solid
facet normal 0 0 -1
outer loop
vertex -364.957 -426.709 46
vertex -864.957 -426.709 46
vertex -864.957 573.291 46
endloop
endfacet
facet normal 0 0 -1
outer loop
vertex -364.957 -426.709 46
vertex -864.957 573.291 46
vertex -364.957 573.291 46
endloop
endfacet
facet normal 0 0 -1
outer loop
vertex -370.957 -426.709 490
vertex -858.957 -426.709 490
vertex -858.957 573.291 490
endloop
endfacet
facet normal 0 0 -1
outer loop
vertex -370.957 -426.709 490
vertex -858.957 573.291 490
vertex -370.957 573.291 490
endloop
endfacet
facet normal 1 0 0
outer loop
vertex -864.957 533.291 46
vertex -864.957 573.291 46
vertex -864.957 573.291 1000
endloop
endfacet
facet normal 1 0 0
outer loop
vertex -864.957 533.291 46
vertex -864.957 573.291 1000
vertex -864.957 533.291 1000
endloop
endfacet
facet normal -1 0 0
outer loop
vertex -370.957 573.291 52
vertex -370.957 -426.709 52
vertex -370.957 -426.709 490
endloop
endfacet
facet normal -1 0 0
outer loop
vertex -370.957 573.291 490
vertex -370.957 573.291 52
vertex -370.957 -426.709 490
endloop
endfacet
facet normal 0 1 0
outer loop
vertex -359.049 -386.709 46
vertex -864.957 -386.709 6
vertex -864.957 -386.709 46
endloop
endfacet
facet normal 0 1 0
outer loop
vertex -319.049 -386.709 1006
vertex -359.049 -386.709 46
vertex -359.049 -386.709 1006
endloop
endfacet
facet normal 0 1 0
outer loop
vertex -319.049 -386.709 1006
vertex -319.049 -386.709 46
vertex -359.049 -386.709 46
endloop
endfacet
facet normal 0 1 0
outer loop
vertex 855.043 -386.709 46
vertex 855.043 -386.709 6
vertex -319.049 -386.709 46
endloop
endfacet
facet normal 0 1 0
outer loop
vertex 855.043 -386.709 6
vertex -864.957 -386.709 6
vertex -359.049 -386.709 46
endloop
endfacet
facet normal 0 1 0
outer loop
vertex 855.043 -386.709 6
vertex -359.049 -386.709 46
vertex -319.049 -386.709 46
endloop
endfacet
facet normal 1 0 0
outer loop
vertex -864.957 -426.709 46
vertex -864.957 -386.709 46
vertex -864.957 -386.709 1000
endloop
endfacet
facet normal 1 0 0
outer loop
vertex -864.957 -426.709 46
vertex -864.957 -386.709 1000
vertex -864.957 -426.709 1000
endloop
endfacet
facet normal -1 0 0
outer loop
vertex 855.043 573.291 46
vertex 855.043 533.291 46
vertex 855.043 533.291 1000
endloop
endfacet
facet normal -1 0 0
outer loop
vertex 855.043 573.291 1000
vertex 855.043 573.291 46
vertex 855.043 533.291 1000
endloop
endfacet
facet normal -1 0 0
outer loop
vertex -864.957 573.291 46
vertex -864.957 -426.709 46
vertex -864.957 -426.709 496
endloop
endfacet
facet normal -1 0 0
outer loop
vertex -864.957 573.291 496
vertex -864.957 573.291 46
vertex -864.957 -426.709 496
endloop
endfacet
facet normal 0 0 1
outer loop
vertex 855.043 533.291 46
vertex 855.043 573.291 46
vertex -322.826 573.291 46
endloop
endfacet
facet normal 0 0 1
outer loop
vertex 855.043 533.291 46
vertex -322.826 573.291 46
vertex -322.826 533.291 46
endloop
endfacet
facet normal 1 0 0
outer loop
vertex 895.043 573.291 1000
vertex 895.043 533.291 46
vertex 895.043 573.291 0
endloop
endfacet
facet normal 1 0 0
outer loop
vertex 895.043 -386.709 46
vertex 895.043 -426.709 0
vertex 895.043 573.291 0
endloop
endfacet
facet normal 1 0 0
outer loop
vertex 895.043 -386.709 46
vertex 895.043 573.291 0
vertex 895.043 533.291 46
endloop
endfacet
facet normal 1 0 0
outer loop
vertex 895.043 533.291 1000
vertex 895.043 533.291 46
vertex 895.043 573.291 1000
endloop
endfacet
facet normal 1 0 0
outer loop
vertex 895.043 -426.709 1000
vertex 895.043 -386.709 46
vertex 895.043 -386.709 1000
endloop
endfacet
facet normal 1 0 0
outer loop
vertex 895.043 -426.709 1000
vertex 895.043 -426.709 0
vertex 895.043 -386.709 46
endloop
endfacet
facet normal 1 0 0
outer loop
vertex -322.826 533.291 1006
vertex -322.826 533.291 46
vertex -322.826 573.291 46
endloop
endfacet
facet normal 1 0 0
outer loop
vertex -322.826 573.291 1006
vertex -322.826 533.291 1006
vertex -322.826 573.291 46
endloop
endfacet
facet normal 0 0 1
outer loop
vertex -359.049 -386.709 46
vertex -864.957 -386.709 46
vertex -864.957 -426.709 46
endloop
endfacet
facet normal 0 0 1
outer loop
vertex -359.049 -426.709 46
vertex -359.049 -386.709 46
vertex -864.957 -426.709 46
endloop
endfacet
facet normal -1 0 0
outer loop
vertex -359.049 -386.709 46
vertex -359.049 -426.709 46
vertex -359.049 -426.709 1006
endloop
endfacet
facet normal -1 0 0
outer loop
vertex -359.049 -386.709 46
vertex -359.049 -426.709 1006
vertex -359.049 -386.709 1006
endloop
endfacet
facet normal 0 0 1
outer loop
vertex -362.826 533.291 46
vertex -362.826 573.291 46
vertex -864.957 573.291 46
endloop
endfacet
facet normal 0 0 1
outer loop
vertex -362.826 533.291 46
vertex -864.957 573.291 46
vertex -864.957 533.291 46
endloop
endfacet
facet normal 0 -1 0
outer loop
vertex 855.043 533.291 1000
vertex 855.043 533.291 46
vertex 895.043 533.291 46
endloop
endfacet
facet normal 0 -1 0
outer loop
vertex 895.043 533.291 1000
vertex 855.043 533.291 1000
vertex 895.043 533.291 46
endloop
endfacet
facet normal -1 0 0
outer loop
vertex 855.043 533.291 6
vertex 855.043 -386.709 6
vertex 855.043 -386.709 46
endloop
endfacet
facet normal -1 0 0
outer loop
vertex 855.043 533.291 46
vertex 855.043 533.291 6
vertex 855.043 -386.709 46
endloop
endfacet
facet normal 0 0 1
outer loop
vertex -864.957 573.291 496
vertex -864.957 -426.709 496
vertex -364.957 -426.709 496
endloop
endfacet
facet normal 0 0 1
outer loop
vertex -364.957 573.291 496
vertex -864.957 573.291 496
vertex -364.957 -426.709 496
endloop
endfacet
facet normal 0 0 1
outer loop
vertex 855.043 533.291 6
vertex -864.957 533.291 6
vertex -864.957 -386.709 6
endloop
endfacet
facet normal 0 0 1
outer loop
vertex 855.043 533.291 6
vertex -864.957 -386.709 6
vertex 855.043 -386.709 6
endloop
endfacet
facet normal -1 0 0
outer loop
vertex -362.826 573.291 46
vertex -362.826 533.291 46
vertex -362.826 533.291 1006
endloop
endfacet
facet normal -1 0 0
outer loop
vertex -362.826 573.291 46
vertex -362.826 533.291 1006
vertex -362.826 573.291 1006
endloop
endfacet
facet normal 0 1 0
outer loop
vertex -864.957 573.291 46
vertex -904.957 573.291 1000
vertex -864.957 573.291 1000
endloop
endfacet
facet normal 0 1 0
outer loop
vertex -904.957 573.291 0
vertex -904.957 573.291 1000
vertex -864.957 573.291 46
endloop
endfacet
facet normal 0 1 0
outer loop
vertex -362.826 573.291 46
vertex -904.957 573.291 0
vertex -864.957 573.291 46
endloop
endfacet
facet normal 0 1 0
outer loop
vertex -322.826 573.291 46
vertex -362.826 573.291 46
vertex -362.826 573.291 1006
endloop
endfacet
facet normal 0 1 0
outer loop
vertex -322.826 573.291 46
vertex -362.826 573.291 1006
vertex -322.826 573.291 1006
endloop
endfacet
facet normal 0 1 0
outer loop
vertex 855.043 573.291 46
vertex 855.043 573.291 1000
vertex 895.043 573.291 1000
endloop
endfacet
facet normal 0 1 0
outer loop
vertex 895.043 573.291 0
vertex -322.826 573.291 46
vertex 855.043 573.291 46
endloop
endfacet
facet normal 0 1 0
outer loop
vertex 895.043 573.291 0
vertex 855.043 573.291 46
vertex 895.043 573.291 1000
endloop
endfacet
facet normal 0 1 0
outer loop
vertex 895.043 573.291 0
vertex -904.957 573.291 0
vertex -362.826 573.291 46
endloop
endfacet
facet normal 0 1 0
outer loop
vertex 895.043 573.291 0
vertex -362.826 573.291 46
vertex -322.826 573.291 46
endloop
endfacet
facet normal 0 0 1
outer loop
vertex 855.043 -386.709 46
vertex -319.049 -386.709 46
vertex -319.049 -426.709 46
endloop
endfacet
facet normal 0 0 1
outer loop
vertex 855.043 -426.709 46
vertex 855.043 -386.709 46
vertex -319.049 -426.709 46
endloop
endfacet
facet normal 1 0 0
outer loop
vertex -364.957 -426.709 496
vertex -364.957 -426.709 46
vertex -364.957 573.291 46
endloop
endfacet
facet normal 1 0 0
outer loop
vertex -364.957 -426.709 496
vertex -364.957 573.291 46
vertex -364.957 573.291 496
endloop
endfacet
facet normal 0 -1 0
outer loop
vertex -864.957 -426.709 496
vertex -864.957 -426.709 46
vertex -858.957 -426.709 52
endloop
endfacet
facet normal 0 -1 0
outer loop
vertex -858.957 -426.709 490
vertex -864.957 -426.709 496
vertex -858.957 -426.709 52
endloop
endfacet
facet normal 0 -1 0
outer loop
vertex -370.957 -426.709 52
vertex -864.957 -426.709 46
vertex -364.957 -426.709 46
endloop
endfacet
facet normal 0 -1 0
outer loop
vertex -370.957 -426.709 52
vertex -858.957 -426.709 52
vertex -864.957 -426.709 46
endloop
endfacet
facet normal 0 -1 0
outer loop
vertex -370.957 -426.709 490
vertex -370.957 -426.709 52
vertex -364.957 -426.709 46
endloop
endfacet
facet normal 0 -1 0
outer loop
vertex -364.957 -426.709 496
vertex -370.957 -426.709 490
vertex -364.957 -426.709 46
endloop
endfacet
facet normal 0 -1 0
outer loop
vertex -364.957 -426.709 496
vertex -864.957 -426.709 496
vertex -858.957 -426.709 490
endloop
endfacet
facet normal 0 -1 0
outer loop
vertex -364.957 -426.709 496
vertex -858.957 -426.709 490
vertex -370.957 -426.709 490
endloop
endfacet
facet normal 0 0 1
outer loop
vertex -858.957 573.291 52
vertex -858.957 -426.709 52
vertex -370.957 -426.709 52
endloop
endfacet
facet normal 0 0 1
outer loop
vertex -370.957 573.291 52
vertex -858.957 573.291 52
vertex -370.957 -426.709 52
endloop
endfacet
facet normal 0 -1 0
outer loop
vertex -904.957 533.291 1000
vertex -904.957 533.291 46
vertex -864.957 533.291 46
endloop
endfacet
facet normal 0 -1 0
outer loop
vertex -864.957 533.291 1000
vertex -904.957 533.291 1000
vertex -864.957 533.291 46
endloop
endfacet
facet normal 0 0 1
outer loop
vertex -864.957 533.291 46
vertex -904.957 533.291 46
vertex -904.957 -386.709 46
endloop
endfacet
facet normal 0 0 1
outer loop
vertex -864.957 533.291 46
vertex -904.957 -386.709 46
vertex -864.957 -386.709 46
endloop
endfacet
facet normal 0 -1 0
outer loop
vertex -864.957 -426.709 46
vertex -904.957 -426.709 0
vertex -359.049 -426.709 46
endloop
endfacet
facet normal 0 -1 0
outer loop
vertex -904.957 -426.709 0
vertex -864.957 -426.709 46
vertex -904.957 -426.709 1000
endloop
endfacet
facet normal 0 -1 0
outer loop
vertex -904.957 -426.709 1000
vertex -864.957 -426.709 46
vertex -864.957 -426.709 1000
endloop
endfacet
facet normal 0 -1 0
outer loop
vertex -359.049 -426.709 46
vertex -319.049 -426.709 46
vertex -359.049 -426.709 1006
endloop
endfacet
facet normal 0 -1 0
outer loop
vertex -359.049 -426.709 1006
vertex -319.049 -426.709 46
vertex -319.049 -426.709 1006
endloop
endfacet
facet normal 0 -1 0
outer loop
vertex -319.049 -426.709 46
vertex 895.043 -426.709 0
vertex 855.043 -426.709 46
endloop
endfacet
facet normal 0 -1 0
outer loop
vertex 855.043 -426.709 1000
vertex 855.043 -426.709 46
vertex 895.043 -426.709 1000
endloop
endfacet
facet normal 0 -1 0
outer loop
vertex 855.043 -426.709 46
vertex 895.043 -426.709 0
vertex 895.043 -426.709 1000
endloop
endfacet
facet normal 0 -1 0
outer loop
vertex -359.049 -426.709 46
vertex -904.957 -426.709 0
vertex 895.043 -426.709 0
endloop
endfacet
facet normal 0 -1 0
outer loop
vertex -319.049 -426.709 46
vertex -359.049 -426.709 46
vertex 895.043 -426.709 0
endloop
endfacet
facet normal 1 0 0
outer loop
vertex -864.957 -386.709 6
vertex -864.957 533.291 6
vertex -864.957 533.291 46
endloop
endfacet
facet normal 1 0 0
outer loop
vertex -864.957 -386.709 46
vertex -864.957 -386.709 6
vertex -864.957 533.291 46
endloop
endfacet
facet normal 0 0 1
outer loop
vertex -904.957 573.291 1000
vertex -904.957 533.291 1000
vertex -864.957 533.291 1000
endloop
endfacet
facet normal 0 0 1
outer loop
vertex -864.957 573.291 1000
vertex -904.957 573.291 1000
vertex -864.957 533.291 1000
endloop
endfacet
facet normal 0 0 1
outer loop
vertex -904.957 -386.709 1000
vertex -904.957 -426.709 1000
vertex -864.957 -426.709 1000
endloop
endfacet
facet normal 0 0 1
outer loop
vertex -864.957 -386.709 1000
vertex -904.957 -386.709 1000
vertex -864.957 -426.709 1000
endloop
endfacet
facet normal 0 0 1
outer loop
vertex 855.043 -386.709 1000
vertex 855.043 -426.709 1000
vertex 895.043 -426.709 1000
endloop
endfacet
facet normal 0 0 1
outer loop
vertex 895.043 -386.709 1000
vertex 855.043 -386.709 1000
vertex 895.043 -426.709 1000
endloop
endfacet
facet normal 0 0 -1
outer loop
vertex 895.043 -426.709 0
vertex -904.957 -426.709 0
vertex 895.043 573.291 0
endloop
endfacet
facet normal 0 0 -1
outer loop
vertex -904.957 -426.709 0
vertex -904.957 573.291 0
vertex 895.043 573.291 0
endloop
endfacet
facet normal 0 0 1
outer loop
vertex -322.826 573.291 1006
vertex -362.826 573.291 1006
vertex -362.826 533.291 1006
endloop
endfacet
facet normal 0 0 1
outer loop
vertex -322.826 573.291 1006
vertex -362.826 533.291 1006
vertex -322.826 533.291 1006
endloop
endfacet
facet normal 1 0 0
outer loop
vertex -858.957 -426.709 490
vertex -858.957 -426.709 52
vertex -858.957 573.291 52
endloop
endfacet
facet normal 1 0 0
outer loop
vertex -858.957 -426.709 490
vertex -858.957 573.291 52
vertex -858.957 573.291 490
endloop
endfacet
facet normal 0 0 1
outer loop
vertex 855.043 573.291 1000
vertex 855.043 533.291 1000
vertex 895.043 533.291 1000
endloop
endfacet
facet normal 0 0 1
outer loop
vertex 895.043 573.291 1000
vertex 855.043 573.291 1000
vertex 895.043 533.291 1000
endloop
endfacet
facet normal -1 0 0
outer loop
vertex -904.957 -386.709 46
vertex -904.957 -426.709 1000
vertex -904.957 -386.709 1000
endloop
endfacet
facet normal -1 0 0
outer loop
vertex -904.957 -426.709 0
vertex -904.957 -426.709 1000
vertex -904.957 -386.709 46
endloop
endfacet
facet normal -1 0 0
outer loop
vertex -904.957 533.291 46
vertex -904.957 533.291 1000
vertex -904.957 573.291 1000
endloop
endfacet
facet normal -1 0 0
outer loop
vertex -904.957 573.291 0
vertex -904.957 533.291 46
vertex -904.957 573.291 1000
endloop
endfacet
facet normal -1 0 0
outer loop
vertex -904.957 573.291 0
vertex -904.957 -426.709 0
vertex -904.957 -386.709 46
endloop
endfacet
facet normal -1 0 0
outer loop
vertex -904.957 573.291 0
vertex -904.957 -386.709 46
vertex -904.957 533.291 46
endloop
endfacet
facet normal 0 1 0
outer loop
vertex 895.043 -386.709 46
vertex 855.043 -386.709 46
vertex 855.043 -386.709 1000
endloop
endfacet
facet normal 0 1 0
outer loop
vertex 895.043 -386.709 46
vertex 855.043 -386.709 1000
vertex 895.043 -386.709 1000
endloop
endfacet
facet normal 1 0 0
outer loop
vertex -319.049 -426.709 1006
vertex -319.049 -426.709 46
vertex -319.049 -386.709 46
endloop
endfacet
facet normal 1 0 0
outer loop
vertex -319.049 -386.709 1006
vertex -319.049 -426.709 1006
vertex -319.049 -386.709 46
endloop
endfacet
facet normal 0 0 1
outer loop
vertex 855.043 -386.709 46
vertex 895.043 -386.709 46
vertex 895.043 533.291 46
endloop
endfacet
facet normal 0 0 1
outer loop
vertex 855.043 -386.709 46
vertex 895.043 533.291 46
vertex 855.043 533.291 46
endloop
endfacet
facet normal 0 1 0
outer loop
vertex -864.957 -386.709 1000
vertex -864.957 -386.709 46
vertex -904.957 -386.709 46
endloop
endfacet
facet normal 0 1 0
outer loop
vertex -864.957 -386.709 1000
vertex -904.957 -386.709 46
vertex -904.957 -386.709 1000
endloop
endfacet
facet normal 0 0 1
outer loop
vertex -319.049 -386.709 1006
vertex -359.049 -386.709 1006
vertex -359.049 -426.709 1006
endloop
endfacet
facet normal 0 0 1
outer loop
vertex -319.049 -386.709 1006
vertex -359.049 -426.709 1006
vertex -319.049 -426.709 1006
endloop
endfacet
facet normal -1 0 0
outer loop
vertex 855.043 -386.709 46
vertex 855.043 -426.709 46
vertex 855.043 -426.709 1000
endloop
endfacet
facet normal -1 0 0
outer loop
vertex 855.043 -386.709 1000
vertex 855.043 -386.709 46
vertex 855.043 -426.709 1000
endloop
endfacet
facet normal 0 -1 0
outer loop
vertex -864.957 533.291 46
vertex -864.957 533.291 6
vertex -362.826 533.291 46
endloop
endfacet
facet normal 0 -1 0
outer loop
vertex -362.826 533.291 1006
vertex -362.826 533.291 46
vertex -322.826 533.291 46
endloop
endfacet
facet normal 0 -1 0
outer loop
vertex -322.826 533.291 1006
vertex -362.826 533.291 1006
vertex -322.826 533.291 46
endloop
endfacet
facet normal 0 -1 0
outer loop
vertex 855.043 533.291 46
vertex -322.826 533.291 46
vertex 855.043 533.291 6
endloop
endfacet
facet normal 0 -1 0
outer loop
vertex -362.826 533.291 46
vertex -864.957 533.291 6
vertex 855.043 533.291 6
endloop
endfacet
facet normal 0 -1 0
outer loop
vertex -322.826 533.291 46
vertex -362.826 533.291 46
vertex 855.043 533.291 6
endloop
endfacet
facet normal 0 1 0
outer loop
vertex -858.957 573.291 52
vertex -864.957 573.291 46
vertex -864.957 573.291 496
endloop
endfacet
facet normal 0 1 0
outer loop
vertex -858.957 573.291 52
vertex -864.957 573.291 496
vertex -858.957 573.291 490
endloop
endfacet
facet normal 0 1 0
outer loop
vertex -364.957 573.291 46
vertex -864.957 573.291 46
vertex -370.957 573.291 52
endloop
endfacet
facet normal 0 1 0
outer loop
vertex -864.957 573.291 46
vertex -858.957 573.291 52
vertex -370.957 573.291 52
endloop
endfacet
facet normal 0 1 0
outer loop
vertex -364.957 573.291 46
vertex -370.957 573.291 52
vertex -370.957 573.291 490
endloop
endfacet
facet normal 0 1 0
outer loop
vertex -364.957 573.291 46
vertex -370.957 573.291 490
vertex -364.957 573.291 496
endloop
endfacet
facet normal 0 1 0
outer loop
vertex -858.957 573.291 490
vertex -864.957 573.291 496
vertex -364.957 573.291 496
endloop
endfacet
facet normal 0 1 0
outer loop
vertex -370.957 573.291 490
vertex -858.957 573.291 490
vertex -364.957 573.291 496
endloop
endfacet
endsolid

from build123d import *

# Parameters (mm, degrees)
F0_W      = 1800
F0_H      = 1000
F1_DEPTH  = 6
F2_W      = 40
F2_H      = 40
F3_DEPTH  = 1000
F4_W      = 40
F4_H      = 40
F5_DEPTH  = 935
F6_W      = 40
F6_H      = 40
F7_DEPTH  = 1742
F8_W      = 40
F8_H      = 40
F9_DEPTH  = 1734
F10_W     = 40
F10_H     = 40
F11_DEPTH = 941
F12_W     = 500
F12_H     = 450
F13_DEPTH = 1000
F14_W     = 488
F14_H     = 438
F15_DEPTH = 1308
F16_W     = 40
F16_H     = 40
F17_W     = 40
F17_H     = 40
F18_DEPTH = 960


with BuildPart() as f1:
    # F0 (on Top) → F1 (new body)
    with BuildSketch(Plane.XY):
        with Locations((-4.9572857097, 73.291340642)):
            Rectangle(F0_W, F0_H)
    extrude(amount=F1_DEPTH)

    # F2 (on face) → F3 (join)
    with BuildSketch(Plane(origin=(0, 0, 0), x_dir=(1, 0, 0), z_dir=(0, 0, -1))):
        with Locations((-884.9572857097, 406.708659358)):
            Rectangle(F2_W, F2_H)
        with Locations((875.0427142903, 406.708659358)):
            Rectangle(F2_W, F2_H)
        with Locations((875.0427142903, -553.291340642)):
            Rectangle(F2_W, F2_H)
        with Locations((-884.9572857097, -553.291340642)):
            Rectangle(F2_W, F2_H)
    extrude(amount=-F3_DEPTH)

    # F4 (on face) → F5 (join)
    with BuildSketch(Plane(origin=(0, -386.708659358, 0), x_dir=(-1, 0, 0), z_dir=(0, 1, 0))):
        with Locations((-875.0427142903, 26)):
            Rectangle(F4_W, F4_H)
    extrude(amount=F5_DEPTH)

    # F6 (on face) → F7 (join)
    with BuildSketch(Plane(origin=(855.0427142903, 0, 0), x_dir=(0, -1, 0), z_dir=(-1, 0, 0))):
        with Locations((-553.291340642, 26)):
            Rectangle(F6_W, F6_H)
    extrude(amount=F7_DEPTH)

    # F8 (on face) → F9 (join)
    with BuildSketch(Plane(origin=(855.0427142903, 0, 0), x_dir=(0, -1, 0), z_dir=(-1, 0, 0))):
        with Locations((406.708659358, 26)):
            Rectangle(F8_W, F8_H)
    extrude(amount=F9_DEPTH)

    # F10 (on face) → F11 (join)
    with BuildSketch(Plane.XZ.offset(-533.291340642)):
        with Locations((-884.9572857097, 26)):
            Rectangle(F10_W, F10_H)
    extrude(amount=F11_DEPTH)

    # F16 (on face) + F17 (on face) → F18 (join)
    with BuildSketch(Plane.XY.offset(46)):
        with Locations((-339.0490221977, -406.708659358)):
            Rectangle(F16_W, F16_H)
    with BuildSketch(Plane.XY.offset(46)):
        with Locations((-342.8259897232, 553.291340642)):
            Rectangle(F17_W, F17_H)
    extrude(amount=F18_DEPTH)


with BuildPart() as f13:
    # F12 (on face) → F13 (new body)
    with BuildSketch(Plane.XZ.offset(426.708659358)):
        with Locations((-614.9572857097, 271)):
            Rectangle(F12_W, F12_H)
    extrude(amount=-F13_DEPTH)

    # F14 (on face) → F15 (cut)
    with BuildSketch(Plane.XZ.offset(426.708659358)):
        with Locations((-614.9572857097, 271)):
            Rectangle(F14_W, F14_H)
    extrude(amount=-F15_DEPTH, mode=Mode.SUBTRACT)


solid = Compound([f1.part, f13.part])
